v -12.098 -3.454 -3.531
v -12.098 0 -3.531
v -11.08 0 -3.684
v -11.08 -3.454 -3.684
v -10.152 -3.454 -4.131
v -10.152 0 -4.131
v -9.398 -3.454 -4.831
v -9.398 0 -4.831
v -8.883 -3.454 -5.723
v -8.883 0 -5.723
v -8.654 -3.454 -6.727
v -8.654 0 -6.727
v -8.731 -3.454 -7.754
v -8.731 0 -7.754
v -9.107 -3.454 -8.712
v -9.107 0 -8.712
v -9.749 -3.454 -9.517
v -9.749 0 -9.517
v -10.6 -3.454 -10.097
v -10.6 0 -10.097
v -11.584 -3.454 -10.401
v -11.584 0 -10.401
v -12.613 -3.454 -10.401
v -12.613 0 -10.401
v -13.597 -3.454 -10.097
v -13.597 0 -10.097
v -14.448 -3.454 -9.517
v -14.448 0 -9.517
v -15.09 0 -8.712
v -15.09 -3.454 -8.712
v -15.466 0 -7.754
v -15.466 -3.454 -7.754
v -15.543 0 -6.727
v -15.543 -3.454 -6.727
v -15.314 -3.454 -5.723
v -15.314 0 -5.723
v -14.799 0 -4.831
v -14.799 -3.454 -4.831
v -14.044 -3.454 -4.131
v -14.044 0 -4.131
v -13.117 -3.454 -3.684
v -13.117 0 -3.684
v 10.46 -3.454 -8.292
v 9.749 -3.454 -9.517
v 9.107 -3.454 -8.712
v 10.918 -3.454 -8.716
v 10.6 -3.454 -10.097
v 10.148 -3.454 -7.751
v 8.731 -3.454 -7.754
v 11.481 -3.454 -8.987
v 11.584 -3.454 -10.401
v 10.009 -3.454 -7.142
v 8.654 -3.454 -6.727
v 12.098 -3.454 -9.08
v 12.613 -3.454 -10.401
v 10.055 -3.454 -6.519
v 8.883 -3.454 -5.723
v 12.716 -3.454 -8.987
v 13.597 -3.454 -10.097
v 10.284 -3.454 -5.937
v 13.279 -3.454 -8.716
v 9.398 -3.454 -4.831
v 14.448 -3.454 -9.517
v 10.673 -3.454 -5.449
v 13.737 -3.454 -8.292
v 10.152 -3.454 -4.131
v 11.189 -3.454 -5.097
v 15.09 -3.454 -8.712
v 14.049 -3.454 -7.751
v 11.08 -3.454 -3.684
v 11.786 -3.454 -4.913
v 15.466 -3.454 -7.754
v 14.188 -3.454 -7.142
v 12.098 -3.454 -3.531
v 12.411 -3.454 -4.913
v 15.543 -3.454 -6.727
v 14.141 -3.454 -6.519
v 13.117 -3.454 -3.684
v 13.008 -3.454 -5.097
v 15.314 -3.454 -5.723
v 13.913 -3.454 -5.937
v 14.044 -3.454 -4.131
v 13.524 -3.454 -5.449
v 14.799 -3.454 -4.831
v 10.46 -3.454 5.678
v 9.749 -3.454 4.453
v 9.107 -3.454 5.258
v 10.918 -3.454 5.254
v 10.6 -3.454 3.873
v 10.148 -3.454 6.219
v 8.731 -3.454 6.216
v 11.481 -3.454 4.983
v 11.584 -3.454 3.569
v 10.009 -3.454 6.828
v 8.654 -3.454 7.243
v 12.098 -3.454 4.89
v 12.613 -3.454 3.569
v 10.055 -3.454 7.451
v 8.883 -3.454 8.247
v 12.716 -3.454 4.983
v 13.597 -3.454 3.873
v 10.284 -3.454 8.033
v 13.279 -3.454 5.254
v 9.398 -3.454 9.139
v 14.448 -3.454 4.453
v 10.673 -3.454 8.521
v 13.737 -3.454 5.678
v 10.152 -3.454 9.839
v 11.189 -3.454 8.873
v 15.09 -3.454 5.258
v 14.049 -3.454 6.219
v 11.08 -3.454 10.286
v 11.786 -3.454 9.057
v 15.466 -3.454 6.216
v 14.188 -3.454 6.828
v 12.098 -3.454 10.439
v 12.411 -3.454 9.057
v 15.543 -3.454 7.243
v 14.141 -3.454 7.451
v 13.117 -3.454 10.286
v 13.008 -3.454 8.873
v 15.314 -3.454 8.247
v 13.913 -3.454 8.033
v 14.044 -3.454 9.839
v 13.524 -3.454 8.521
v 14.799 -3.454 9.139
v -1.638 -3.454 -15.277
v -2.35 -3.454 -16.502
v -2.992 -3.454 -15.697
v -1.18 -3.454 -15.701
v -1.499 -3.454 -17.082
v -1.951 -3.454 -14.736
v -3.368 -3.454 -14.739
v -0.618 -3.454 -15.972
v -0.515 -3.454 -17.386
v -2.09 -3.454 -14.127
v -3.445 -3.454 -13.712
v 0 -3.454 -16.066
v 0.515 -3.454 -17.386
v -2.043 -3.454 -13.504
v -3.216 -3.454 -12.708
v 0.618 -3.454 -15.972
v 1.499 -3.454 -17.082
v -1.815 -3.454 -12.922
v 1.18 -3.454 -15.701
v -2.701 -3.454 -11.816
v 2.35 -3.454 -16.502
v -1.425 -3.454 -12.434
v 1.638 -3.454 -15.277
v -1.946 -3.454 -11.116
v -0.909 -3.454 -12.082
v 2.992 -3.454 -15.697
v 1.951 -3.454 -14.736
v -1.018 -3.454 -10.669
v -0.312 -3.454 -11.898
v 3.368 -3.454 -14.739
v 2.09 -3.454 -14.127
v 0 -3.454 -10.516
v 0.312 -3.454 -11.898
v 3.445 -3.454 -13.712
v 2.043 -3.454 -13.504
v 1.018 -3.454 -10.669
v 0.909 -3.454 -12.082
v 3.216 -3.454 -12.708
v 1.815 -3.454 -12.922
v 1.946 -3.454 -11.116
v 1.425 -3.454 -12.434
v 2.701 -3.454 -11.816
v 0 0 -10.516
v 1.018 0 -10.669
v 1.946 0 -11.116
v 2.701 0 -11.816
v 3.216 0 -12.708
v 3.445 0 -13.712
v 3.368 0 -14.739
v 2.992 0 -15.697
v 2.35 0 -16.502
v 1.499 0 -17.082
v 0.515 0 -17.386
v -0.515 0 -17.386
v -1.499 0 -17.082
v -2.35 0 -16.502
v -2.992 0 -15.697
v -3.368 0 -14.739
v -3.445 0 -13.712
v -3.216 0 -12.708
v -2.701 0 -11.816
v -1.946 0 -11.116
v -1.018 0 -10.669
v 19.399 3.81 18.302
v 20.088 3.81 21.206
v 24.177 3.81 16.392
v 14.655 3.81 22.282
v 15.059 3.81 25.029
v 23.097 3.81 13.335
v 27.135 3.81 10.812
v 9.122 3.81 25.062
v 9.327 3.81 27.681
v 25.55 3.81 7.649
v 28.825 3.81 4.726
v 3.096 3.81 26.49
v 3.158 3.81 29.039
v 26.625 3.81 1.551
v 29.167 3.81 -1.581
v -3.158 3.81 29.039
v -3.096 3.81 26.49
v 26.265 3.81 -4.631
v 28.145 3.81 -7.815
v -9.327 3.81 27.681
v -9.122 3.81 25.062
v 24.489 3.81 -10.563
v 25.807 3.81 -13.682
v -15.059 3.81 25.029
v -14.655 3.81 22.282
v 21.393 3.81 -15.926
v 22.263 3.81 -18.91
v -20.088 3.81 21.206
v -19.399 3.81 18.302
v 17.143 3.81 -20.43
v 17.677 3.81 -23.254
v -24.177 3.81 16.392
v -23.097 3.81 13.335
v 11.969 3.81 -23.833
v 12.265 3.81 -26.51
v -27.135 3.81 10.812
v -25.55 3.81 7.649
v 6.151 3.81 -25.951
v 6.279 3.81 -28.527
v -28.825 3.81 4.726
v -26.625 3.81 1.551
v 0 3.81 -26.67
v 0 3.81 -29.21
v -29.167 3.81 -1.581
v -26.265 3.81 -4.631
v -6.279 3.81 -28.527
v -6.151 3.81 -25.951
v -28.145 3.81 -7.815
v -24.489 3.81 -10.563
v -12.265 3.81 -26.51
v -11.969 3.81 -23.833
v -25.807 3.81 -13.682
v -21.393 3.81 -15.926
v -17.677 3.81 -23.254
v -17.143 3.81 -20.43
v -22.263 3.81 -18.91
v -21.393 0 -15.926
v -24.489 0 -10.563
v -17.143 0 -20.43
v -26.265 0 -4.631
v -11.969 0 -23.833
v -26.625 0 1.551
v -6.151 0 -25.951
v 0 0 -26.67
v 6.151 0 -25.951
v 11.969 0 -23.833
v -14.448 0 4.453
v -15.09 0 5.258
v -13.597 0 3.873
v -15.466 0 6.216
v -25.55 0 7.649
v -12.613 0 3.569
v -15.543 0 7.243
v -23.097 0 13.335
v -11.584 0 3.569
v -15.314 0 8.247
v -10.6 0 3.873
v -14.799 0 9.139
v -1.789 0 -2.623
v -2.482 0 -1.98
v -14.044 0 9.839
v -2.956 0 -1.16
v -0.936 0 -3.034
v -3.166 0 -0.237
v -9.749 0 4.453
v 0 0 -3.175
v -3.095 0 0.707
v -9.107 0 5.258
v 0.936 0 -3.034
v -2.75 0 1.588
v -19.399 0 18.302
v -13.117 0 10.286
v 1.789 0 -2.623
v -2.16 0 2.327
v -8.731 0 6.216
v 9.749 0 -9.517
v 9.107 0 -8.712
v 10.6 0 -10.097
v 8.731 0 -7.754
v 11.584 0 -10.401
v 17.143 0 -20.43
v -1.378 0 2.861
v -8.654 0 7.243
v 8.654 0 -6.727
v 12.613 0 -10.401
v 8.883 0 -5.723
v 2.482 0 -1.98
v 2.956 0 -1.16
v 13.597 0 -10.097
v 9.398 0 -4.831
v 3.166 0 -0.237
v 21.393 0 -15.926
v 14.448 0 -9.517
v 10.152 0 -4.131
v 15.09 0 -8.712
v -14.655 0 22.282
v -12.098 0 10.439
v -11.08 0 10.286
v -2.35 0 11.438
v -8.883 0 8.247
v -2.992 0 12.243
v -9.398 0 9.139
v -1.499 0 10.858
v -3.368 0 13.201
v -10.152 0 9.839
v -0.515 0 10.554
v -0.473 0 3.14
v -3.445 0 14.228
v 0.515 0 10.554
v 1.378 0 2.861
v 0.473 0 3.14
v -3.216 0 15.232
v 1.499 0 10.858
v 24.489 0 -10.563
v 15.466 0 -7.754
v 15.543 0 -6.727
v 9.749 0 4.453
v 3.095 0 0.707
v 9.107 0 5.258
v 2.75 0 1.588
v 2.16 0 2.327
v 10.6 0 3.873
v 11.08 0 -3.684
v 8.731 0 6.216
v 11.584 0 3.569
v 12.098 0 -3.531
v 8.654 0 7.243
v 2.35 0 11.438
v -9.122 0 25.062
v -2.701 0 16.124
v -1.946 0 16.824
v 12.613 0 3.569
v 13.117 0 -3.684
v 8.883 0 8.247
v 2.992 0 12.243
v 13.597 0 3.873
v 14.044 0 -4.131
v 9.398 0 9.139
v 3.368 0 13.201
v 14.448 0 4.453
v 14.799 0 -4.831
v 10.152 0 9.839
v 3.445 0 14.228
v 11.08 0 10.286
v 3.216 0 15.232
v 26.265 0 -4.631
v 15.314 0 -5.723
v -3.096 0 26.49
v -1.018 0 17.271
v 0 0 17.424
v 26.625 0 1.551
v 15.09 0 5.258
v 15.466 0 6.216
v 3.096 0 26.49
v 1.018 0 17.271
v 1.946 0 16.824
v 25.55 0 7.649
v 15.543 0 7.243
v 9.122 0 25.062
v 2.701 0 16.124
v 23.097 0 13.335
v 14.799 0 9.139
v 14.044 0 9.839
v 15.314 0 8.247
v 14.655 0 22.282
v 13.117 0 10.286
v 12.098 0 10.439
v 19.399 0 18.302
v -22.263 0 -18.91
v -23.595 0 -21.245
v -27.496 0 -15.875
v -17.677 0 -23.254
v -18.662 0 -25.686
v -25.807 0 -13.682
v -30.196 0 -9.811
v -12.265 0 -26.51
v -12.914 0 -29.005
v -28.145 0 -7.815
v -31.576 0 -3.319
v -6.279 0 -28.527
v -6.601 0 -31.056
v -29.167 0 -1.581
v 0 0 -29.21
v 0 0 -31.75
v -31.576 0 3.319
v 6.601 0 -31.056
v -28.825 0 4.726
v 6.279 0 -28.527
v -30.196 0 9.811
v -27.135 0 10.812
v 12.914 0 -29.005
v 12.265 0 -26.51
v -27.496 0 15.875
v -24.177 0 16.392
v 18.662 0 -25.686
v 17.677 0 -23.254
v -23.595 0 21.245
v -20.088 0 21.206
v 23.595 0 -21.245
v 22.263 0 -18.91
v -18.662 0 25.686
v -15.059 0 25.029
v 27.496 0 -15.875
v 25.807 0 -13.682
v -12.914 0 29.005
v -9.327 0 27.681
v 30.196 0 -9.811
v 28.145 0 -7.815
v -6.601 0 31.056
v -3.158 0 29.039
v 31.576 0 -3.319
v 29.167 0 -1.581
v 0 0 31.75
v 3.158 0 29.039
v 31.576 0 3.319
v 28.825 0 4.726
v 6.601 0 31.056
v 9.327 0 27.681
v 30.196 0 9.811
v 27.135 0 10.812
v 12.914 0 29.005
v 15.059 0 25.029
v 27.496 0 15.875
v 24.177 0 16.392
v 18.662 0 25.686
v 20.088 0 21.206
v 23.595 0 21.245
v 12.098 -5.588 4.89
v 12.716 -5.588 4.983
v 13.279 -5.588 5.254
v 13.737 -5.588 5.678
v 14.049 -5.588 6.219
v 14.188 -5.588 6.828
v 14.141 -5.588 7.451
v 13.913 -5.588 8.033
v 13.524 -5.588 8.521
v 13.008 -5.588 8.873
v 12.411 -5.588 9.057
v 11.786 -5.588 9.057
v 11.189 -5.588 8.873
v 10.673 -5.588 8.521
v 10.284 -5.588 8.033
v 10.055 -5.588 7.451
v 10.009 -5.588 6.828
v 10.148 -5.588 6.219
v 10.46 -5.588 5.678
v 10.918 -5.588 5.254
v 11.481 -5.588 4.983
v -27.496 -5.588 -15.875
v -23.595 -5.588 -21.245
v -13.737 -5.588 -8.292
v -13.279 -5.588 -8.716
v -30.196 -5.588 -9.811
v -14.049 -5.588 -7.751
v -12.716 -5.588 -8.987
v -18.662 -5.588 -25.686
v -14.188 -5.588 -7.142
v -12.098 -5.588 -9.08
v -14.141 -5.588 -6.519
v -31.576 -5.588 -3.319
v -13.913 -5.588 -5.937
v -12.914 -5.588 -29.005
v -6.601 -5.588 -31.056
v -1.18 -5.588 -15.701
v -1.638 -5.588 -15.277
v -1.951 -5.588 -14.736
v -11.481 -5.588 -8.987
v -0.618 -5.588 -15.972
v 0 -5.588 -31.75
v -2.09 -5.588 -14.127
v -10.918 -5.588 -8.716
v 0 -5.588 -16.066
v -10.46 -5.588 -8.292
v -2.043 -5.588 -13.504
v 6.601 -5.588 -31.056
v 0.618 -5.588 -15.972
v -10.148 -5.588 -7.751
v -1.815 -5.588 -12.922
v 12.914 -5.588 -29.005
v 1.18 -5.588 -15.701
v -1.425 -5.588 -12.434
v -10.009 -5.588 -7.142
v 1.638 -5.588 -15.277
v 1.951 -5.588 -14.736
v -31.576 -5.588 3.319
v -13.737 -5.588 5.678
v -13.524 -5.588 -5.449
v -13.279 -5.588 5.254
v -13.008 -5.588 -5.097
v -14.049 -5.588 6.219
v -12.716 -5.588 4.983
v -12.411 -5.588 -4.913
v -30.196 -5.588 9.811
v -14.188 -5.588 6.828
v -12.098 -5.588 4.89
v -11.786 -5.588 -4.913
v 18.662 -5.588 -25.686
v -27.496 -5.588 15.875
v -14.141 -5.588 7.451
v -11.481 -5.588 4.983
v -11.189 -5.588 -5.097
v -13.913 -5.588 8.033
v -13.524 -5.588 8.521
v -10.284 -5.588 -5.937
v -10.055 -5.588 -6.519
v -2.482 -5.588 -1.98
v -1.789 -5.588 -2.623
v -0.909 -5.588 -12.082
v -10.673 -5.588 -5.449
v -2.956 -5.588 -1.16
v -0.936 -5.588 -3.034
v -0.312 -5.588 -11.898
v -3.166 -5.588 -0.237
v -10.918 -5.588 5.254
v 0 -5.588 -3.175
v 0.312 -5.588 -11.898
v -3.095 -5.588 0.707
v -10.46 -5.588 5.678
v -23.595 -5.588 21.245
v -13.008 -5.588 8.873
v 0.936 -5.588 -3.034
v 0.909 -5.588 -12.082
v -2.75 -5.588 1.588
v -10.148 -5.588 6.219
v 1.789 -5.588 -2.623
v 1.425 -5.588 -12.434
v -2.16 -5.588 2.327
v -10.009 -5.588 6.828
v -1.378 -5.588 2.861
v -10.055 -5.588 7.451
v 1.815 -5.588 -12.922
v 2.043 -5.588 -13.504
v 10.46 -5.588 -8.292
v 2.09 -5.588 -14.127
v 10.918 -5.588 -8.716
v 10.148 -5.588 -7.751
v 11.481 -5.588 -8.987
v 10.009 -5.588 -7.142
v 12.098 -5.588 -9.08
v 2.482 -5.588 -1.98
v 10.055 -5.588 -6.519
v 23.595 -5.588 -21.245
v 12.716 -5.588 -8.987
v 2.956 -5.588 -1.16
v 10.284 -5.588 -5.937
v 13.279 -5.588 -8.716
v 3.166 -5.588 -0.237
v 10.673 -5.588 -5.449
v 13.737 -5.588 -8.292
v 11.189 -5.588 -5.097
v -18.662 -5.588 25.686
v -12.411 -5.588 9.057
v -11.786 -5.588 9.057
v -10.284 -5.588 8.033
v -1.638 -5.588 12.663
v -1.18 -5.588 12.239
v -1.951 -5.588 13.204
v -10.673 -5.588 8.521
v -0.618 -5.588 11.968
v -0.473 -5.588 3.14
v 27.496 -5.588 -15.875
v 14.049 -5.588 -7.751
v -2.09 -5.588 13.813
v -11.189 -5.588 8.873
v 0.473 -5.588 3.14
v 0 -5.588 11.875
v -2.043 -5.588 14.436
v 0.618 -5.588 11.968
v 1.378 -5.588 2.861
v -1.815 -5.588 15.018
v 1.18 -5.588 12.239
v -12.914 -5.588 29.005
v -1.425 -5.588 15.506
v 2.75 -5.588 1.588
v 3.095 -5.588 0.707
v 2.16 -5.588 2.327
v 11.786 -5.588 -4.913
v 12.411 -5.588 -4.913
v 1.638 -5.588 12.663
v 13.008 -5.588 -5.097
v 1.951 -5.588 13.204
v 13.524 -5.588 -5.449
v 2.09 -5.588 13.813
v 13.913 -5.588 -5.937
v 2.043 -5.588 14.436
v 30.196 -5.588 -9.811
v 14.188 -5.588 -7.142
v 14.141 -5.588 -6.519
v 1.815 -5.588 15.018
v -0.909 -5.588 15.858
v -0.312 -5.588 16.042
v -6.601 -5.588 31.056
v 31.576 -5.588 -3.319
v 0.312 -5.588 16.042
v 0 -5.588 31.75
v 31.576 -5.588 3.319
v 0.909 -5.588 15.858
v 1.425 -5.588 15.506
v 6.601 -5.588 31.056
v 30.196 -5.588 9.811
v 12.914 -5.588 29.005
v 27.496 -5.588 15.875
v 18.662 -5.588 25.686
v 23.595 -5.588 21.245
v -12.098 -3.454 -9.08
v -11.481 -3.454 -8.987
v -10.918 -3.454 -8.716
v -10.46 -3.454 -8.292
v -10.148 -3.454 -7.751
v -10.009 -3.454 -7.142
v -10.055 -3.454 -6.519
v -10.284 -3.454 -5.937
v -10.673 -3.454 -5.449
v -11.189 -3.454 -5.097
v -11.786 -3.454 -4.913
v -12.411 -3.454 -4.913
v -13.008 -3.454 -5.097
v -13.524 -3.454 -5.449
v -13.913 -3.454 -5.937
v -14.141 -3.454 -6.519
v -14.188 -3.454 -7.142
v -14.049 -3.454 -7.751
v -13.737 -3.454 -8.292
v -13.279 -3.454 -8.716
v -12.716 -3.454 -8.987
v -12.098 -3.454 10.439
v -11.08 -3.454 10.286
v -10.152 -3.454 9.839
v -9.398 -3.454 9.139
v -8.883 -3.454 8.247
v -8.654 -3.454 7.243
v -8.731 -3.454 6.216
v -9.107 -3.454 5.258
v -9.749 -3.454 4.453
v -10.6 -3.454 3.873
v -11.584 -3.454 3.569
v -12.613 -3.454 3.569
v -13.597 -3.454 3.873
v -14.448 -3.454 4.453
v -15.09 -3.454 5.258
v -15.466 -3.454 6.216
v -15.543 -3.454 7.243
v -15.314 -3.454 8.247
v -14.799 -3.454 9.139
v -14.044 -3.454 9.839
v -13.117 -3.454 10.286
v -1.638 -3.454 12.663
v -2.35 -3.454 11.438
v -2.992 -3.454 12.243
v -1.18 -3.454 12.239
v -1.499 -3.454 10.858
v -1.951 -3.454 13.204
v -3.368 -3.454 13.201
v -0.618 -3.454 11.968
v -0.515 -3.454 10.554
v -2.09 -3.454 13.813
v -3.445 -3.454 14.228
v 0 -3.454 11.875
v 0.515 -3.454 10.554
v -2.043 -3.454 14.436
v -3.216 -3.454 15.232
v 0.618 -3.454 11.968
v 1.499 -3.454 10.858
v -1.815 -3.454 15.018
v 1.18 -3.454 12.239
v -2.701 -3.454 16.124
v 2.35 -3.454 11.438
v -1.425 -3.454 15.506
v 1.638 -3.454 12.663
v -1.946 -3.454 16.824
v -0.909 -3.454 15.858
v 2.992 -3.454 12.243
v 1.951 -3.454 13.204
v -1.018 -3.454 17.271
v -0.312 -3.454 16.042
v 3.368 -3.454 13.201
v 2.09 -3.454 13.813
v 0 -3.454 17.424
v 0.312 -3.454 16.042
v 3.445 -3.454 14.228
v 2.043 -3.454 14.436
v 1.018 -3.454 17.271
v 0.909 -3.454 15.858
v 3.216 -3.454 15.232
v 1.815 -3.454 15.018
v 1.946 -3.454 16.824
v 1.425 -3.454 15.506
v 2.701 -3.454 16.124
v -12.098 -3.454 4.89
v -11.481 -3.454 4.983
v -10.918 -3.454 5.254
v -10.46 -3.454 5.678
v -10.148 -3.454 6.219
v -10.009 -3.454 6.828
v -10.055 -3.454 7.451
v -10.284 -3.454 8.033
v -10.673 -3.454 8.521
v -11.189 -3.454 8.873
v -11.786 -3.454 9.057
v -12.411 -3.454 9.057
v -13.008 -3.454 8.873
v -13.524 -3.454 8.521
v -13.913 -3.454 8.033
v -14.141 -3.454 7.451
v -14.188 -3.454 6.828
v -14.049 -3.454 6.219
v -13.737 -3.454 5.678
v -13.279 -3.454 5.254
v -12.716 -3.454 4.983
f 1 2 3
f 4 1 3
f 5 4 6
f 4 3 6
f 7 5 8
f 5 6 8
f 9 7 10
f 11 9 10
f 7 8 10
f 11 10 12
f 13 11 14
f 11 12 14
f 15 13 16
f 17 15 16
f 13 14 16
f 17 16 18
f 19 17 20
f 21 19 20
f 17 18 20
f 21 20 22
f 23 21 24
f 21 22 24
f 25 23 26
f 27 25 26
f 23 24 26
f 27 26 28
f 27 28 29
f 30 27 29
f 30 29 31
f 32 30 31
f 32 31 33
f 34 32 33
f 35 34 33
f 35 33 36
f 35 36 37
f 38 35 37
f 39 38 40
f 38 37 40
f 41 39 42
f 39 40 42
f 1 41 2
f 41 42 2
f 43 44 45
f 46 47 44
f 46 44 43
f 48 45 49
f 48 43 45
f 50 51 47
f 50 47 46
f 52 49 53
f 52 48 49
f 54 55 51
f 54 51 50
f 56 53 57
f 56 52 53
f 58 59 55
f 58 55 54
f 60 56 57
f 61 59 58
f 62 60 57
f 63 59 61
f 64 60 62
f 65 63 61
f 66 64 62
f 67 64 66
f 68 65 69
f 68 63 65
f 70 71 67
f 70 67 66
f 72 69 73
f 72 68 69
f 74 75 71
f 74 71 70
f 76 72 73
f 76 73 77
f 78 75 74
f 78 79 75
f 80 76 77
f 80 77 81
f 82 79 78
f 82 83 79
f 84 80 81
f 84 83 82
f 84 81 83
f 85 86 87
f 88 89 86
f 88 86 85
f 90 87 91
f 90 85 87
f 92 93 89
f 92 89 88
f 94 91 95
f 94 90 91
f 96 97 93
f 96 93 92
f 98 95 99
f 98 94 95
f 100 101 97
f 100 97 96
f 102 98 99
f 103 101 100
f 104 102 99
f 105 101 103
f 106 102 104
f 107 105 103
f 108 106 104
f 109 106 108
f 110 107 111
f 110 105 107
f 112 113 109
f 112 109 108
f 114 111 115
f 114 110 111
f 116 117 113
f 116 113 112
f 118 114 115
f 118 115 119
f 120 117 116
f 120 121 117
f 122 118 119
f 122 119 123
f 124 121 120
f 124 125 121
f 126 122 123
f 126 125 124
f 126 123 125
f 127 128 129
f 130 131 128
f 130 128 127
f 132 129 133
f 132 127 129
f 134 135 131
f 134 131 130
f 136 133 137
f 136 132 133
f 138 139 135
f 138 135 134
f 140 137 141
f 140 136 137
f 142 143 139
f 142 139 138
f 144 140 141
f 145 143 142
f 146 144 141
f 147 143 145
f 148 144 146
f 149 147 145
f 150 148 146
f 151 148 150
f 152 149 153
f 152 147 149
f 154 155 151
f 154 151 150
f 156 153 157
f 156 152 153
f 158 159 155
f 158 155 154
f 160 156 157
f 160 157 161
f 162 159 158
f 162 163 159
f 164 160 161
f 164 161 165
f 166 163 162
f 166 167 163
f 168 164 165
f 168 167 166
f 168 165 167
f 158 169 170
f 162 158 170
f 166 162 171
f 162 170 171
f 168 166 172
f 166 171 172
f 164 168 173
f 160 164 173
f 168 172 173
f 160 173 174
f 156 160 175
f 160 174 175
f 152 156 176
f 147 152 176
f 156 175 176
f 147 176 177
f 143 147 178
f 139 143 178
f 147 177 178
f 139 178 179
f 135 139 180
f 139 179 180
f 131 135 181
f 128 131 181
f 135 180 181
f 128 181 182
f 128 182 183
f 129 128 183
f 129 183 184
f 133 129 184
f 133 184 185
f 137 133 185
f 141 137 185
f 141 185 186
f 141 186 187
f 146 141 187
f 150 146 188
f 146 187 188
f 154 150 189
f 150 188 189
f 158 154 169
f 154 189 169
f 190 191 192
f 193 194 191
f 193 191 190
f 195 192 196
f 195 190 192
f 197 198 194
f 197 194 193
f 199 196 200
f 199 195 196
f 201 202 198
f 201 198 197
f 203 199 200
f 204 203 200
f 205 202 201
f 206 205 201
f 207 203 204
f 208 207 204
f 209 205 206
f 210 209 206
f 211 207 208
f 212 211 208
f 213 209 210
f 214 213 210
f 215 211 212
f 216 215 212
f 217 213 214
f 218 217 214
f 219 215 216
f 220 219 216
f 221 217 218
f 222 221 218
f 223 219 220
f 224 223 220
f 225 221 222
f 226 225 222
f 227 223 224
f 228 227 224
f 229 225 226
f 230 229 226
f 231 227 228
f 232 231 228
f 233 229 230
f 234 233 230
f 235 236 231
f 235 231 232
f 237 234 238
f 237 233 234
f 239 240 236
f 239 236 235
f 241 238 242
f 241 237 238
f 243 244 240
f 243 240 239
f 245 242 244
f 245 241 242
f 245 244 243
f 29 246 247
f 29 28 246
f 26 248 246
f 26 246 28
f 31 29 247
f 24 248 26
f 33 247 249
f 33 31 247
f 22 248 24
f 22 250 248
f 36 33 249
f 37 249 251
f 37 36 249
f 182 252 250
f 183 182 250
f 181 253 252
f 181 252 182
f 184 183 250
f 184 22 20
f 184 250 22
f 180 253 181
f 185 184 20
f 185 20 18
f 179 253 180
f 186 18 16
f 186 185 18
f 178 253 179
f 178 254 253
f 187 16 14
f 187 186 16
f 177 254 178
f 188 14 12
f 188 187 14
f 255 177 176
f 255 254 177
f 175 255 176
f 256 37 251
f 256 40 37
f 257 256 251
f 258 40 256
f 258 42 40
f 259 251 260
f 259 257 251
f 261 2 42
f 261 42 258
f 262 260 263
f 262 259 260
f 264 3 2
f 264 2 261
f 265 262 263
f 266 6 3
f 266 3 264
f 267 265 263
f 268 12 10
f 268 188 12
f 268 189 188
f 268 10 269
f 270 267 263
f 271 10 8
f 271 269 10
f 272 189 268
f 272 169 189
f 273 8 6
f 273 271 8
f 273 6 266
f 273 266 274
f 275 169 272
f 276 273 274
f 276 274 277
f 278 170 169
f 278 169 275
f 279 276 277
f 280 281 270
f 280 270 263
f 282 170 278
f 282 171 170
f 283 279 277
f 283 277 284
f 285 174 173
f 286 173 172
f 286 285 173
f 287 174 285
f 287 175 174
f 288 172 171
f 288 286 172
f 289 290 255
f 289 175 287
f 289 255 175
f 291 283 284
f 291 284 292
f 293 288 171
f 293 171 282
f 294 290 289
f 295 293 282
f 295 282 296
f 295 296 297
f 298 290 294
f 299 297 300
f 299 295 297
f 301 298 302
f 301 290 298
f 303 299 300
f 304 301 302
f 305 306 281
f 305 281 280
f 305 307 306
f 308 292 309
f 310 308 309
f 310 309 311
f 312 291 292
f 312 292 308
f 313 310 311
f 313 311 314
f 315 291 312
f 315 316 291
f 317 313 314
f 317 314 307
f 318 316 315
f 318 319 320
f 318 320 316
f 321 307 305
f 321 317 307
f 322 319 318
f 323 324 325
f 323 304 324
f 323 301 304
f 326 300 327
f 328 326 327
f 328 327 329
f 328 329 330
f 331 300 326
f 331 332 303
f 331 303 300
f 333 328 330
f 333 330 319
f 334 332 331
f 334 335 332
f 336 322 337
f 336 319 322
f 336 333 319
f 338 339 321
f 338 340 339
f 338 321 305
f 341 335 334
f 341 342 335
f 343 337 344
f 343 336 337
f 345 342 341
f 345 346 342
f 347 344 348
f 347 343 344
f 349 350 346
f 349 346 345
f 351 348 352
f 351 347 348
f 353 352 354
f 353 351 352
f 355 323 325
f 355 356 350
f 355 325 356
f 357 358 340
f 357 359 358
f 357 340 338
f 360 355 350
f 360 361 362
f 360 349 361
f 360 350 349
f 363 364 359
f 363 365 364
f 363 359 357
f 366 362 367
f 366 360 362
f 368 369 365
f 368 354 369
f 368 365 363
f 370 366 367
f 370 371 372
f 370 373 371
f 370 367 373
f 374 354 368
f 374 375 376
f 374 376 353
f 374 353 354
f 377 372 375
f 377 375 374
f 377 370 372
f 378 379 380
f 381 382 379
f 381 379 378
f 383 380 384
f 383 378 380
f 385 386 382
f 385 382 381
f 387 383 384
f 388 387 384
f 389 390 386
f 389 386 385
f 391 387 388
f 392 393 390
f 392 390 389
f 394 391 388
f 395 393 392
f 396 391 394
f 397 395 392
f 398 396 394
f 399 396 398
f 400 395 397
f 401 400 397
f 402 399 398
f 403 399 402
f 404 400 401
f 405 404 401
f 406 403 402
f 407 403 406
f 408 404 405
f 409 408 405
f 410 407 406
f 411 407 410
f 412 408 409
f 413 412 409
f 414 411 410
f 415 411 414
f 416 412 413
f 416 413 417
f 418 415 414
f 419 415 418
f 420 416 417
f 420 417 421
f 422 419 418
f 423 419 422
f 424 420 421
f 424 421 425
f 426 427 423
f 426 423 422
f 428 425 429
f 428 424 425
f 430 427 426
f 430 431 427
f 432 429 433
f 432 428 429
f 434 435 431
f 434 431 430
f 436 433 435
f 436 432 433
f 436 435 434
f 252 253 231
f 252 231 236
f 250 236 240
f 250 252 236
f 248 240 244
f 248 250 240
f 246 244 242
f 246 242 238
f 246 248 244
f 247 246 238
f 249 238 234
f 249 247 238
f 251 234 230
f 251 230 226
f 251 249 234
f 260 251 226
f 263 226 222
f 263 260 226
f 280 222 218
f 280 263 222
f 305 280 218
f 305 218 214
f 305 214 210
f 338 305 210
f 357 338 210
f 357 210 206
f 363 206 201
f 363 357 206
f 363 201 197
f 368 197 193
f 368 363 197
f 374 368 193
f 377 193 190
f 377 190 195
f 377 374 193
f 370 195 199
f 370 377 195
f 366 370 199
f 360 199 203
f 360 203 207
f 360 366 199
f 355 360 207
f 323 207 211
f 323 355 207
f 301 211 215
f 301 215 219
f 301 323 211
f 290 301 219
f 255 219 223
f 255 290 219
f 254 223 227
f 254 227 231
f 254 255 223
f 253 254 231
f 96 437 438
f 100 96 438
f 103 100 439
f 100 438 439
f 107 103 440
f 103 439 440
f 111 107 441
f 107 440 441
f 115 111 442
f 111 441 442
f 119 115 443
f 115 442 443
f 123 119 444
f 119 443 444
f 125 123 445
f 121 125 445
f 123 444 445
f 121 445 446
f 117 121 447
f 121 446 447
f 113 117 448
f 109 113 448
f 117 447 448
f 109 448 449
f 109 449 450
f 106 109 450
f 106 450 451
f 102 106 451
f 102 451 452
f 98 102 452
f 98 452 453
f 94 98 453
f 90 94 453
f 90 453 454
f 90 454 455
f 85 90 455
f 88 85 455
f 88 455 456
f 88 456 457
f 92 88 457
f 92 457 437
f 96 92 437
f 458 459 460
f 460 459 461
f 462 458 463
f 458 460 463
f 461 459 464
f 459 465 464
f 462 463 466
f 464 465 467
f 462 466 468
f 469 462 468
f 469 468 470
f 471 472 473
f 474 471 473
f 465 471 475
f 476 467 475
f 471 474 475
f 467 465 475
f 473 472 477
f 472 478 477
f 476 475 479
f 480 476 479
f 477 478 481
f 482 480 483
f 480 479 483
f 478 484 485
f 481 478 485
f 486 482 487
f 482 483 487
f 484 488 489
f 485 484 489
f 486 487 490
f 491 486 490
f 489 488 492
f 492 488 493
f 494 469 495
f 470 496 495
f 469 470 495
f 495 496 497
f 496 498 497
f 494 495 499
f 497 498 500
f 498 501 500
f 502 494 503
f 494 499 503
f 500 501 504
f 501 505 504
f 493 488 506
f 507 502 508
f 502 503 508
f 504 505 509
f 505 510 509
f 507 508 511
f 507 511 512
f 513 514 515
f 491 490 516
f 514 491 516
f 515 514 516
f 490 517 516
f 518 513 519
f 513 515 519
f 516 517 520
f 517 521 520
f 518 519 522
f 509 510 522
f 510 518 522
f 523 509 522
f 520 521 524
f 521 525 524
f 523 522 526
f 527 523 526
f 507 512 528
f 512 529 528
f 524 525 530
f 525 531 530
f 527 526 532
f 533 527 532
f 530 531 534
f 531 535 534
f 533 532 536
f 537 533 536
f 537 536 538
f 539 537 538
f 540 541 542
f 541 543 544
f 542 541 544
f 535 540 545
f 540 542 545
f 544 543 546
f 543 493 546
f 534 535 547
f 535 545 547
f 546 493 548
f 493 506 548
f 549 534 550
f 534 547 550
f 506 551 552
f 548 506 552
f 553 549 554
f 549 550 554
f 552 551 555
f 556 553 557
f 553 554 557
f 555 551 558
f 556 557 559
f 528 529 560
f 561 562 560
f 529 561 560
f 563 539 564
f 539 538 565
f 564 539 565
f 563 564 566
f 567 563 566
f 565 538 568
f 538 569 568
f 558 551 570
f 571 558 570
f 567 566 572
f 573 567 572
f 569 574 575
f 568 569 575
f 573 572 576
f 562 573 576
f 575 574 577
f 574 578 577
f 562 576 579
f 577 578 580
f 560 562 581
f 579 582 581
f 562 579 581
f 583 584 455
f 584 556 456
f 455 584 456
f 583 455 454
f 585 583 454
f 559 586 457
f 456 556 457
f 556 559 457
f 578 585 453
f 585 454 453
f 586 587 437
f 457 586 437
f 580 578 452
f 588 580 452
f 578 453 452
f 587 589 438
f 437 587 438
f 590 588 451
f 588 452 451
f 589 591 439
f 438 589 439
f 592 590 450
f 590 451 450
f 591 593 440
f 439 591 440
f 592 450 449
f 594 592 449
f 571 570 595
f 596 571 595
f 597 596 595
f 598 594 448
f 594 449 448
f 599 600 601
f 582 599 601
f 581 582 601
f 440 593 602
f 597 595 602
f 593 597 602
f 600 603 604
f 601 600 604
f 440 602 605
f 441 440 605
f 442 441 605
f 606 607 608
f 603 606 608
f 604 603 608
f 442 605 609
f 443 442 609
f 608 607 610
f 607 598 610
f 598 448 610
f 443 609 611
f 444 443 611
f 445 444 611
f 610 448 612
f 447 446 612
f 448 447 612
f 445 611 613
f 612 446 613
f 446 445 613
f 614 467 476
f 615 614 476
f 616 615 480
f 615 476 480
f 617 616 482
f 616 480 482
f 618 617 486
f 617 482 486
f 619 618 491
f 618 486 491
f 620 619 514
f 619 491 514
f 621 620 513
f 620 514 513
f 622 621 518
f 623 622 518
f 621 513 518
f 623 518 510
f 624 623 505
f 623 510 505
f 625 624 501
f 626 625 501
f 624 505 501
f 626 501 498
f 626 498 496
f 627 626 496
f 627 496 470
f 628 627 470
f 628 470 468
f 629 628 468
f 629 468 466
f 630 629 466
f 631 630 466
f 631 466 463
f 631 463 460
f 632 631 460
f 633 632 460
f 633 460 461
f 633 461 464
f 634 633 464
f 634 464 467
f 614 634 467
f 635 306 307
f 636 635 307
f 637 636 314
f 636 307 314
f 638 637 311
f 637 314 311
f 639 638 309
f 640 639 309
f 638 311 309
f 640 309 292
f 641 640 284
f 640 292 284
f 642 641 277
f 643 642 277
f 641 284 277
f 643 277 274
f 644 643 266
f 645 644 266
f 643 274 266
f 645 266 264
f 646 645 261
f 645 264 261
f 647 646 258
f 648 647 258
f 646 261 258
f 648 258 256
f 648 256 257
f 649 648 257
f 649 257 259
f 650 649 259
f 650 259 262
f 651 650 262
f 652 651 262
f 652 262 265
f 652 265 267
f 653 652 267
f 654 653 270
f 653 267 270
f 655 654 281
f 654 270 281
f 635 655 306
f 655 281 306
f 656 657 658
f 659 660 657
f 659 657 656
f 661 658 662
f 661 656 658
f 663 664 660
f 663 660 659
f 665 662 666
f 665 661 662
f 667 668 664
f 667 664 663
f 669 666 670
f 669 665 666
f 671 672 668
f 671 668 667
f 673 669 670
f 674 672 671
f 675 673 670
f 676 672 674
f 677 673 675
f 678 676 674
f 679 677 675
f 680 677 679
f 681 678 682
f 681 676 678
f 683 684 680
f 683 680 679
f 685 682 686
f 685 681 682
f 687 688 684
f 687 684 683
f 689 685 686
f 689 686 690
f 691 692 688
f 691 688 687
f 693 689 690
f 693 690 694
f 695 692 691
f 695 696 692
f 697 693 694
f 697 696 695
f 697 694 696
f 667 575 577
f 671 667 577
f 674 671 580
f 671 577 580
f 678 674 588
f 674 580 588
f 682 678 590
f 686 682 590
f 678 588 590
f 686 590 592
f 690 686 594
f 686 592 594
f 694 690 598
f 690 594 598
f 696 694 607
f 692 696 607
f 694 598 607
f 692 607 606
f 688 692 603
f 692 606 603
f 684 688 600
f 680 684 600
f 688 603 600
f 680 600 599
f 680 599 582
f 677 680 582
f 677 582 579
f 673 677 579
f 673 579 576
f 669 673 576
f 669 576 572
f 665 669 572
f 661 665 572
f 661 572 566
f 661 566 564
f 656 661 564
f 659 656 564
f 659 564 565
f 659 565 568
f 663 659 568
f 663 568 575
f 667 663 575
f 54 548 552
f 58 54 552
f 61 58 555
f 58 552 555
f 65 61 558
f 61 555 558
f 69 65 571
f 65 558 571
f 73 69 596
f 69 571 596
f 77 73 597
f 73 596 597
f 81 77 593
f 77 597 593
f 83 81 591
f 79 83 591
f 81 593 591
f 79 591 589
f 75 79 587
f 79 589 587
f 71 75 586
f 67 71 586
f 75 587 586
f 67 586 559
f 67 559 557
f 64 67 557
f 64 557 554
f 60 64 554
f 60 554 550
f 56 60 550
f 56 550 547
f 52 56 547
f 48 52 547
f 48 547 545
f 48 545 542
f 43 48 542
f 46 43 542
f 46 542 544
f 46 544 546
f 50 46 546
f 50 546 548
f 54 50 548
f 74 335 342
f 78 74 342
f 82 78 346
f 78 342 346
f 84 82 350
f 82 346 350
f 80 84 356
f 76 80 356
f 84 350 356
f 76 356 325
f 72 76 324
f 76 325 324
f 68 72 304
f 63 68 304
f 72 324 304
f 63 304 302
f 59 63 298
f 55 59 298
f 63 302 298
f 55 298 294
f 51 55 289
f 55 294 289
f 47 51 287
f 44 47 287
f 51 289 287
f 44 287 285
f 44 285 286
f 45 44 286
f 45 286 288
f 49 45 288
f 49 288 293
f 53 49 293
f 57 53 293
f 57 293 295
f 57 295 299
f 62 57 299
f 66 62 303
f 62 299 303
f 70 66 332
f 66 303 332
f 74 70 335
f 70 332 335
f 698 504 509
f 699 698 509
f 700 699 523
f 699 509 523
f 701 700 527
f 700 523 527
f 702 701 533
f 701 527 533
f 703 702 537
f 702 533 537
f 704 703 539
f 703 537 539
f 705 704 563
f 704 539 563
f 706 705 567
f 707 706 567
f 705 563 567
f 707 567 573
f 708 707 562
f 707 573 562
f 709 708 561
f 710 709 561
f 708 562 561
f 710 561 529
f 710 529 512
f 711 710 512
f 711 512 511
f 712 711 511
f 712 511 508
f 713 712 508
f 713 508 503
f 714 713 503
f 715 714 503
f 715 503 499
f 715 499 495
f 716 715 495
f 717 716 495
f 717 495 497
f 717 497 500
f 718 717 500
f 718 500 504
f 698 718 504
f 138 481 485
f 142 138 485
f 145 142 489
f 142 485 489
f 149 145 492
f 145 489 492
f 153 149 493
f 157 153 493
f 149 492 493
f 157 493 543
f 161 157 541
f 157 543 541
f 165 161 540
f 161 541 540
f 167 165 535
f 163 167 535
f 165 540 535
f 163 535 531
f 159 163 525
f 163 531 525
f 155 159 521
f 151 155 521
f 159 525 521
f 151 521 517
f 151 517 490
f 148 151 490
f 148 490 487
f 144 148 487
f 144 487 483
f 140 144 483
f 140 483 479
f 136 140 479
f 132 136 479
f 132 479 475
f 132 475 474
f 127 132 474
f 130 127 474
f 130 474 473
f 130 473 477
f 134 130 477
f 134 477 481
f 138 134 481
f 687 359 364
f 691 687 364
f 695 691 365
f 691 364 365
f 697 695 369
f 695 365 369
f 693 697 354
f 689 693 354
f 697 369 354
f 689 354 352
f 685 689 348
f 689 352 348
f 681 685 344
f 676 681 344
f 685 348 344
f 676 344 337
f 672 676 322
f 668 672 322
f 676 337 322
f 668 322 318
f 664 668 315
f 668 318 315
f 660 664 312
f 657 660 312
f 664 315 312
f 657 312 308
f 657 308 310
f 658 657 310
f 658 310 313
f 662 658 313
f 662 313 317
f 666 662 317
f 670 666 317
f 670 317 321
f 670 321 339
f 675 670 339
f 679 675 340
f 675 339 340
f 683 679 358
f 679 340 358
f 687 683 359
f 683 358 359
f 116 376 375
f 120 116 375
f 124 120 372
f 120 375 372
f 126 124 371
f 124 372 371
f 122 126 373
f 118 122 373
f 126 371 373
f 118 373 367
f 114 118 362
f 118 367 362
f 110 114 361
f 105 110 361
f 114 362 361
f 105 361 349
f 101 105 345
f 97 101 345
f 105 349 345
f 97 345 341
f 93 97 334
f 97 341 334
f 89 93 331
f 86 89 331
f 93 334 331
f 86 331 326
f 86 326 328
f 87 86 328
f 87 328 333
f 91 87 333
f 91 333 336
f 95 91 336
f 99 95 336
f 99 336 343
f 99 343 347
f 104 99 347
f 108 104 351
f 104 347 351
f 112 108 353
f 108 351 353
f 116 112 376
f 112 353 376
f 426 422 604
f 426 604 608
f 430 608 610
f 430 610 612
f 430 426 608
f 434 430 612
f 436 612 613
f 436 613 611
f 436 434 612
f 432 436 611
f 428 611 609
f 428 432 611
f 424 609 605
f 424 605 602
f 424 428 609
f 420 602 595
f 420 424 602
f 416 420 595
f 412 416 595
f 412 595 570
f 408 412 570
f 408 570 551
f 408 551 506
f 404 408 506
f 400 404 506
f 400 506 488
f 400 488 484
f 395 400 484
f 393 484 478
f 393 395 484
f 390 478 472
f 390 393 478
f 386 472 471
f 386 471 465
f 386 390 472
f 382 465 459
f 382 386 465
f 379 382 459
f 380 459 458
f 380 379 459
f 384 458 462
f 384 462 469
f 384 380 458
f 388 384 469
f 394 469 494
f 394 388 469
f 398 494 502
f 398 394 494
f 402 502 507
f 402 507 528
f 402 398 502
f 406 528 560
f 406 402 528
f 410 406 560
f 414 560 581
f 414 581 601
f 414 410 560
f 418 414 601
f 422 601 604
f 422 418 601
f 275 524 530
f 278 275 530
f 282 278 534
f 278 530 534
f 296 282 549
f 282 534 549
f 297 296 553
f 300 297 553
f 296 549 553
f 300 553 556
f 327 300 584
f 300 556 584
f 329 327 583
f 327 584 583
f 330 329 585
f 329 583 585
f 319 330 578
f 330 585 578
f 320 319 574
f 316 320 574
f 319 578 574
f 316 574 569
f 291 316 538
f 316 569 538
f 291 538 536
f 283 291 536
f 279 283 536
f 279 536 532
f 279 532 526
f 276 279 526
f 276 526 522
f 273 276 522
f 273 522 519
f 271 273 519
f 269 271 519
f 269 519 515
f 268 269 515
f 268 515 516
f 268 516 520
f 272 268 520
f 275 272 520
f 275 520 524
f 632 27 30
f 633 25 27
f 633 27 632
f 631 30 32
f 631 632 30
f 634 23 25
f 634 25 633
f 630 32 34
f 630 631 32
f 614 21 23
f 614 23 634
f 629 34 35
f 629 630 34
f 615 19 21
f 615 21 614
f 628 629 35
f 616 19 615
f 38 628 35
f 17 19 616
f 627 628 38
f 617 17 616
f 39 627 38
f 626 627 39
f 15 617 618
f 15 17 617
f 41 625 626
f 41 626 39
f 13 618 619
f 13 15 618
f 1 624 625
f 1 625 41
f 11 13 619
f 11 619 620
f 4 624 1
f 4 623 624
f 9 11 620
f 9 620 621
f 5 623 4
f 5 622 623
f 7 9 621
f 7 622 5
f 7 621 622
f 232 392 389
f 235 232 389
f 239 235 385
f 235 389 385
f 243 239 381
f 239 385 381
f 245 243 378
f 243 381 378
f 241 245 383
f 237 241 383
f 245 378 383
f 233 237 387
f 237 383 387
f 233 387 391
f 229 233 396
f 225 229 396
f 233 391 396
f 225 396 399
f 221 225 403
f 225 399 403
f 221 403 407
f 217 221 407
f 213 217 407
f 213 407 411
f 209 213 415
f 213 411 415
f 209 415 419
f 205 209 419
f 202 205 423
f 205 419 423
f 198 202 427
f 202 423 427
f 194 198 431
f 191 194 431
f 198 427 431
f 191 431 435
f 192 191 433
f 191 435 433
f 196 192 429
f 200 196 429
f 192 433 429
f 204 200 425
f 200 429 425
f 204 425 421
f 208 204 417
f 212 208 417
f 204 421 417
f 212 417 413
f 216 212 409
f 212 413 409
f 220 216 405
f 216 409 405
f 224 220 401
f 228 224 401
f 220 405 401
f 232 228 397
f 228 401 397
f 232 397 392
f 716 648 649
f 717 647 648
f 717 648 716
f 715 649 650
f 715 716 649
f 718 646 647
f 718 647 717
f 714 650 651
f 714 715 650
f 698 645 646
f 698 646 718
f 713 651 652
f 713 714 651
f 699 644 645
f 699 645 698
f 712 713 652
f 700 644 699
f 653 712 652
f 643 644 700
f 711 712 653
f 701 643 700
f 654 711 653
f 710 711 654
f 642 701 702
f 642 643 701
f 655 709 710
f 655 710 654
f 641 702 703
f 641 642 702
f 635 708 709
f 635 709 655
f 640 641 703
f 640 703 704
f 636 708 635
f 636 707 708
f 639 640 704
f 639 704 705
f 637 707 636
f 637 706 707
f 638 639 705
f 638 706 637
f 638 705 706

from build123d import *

# Parameters (mm, degrees)
SKETCH1_R           = 31.75
BOSS_EXTRUDE1_DEPTH = 5.588
SKETCH2_R           = 2.0955
CUT_EXTRUDE1_DEPTH  = 7.62
SKETCH5_R           = 3.4544
CUT_EXTRUDE2_DEPTH  = 3.4544
SKETCH6_R           = 3.175
CUT_EXTRUDE3_DEPTH  = 46.247660094
SKETCH9_R           = 29.21
SKETCH9_R_2         = 26.67
BOSS_EXTRUDE3_DEPTH = 3.81


with BuildPart() as part:
    # Sketch1 → Boss-Extrude1 (new body)
    with BuildSketch(Plane(origin=(0, 0, 0), x_dir=(1, 0, 0), z_dir=(0, 1, 0))):
        with Locations(Location((0, 0, 0), (0, 0, 270))):
            Circle(SKETCH1_R)
    extrude(amount=-BOSS_EXTRUDE1_DEPTH)

    # Sketch2 → Cut-Extrude1 (cut)
    with BuildSketch(Plane.XZ.offset(5.588)):
        with Locations(Location((0, 13.97, 0), (0, 0, 270))):
            Circle(SKETCH2_R)
        with Locations(Location((12.098374891, 6.985, 0), (0, 0, 270))):
            Circle(SKETCH2_R)
        with Locations(Location((12.098374891, -6.985, 0), (0, 0, 270))):
            Circle(SKETCH2_R)
        with Locations(Location((0, -13.97, 0), (0, 0, 270))):
            Circle(SKETCH2_R)
        with Locations(Location((-12.098374891, -6.985, 0), (0, 0, 270))):
            Circle(SKETCH2_R)
        with Locations(Location((-12.098374891, 6.985, 0), (0, 0, 270))):
            Circle(SKETCH2_R)
    extrude(amount=-CUT_EXTRUDE1_DEPTH, mode=Mode.SUBTRACT)

    # Sketch5 → Cut-Extrude2 (cut)
    with BuildSketch(Plane(origin=(0, 0, 0), x_dir=(1, 0, 0), z_dir=(0, 1, 0))):
        with Locations(Location((12.098374891, -6.985, 0), (0, 0, 270))):
            Circle(SKETCH5_R)
        with Locations(Location((0, -13.97, 0), (0, 0, 270))):
            Circle(SKETCH5_R)
        with Locations(Location((-12.098374891, -6.985, 0), (0, 0, 270))):
            Circle(SKETCH5_R)
        with Locations(Location((-12.098374891, 6.985, 0), (0, 0, 270))):
            Circle(SKETCH5_R)
        with Locations(Location((0, 13.97, 0), (0, 0, 270))):
            Circle(SKETCH5_R)
        with Locations(Location((12.098374891, 6.985, 0), (0, 0, 270))):
            Circle(SKETCH5_R)
    extrude(amount=-CUT_EXTRUDE2_DEPTH, mode=Mode.SUBTRACT)

    # Sketch6 → Cut-Extrude3 (cut, through all)
    with BuildSketch(Plane.XZ.offset(5.588)):
        with Locations(Location((0, 0, 0), (0, 0, 270))):
            Circle(SKETCH6_R)
    extrude(amount=-CUT_EXTRUDE3_DEPTH, mode=Mode.SUBTRACT)

    # Sketch9 → Boss-Extrude3 (add)
    with BuildSketch(Plane(origin=(0, 0, 0), x_dir=(1, 0, 0), z_dir=(0, 1, 0))):
        with Locations(Location((0, 0, 0), (0, 0, 90))):
            Circle(SKETCH9_R)
        with Locations(Location((0, 0, 0), (0, 0, 90))):
            Circle(SKETCH9_R_2, mode=Mode.SUBTRACT)
    extrude(amount=BOSS_EXTRUDE3_DEPTH)


solid = part.part
